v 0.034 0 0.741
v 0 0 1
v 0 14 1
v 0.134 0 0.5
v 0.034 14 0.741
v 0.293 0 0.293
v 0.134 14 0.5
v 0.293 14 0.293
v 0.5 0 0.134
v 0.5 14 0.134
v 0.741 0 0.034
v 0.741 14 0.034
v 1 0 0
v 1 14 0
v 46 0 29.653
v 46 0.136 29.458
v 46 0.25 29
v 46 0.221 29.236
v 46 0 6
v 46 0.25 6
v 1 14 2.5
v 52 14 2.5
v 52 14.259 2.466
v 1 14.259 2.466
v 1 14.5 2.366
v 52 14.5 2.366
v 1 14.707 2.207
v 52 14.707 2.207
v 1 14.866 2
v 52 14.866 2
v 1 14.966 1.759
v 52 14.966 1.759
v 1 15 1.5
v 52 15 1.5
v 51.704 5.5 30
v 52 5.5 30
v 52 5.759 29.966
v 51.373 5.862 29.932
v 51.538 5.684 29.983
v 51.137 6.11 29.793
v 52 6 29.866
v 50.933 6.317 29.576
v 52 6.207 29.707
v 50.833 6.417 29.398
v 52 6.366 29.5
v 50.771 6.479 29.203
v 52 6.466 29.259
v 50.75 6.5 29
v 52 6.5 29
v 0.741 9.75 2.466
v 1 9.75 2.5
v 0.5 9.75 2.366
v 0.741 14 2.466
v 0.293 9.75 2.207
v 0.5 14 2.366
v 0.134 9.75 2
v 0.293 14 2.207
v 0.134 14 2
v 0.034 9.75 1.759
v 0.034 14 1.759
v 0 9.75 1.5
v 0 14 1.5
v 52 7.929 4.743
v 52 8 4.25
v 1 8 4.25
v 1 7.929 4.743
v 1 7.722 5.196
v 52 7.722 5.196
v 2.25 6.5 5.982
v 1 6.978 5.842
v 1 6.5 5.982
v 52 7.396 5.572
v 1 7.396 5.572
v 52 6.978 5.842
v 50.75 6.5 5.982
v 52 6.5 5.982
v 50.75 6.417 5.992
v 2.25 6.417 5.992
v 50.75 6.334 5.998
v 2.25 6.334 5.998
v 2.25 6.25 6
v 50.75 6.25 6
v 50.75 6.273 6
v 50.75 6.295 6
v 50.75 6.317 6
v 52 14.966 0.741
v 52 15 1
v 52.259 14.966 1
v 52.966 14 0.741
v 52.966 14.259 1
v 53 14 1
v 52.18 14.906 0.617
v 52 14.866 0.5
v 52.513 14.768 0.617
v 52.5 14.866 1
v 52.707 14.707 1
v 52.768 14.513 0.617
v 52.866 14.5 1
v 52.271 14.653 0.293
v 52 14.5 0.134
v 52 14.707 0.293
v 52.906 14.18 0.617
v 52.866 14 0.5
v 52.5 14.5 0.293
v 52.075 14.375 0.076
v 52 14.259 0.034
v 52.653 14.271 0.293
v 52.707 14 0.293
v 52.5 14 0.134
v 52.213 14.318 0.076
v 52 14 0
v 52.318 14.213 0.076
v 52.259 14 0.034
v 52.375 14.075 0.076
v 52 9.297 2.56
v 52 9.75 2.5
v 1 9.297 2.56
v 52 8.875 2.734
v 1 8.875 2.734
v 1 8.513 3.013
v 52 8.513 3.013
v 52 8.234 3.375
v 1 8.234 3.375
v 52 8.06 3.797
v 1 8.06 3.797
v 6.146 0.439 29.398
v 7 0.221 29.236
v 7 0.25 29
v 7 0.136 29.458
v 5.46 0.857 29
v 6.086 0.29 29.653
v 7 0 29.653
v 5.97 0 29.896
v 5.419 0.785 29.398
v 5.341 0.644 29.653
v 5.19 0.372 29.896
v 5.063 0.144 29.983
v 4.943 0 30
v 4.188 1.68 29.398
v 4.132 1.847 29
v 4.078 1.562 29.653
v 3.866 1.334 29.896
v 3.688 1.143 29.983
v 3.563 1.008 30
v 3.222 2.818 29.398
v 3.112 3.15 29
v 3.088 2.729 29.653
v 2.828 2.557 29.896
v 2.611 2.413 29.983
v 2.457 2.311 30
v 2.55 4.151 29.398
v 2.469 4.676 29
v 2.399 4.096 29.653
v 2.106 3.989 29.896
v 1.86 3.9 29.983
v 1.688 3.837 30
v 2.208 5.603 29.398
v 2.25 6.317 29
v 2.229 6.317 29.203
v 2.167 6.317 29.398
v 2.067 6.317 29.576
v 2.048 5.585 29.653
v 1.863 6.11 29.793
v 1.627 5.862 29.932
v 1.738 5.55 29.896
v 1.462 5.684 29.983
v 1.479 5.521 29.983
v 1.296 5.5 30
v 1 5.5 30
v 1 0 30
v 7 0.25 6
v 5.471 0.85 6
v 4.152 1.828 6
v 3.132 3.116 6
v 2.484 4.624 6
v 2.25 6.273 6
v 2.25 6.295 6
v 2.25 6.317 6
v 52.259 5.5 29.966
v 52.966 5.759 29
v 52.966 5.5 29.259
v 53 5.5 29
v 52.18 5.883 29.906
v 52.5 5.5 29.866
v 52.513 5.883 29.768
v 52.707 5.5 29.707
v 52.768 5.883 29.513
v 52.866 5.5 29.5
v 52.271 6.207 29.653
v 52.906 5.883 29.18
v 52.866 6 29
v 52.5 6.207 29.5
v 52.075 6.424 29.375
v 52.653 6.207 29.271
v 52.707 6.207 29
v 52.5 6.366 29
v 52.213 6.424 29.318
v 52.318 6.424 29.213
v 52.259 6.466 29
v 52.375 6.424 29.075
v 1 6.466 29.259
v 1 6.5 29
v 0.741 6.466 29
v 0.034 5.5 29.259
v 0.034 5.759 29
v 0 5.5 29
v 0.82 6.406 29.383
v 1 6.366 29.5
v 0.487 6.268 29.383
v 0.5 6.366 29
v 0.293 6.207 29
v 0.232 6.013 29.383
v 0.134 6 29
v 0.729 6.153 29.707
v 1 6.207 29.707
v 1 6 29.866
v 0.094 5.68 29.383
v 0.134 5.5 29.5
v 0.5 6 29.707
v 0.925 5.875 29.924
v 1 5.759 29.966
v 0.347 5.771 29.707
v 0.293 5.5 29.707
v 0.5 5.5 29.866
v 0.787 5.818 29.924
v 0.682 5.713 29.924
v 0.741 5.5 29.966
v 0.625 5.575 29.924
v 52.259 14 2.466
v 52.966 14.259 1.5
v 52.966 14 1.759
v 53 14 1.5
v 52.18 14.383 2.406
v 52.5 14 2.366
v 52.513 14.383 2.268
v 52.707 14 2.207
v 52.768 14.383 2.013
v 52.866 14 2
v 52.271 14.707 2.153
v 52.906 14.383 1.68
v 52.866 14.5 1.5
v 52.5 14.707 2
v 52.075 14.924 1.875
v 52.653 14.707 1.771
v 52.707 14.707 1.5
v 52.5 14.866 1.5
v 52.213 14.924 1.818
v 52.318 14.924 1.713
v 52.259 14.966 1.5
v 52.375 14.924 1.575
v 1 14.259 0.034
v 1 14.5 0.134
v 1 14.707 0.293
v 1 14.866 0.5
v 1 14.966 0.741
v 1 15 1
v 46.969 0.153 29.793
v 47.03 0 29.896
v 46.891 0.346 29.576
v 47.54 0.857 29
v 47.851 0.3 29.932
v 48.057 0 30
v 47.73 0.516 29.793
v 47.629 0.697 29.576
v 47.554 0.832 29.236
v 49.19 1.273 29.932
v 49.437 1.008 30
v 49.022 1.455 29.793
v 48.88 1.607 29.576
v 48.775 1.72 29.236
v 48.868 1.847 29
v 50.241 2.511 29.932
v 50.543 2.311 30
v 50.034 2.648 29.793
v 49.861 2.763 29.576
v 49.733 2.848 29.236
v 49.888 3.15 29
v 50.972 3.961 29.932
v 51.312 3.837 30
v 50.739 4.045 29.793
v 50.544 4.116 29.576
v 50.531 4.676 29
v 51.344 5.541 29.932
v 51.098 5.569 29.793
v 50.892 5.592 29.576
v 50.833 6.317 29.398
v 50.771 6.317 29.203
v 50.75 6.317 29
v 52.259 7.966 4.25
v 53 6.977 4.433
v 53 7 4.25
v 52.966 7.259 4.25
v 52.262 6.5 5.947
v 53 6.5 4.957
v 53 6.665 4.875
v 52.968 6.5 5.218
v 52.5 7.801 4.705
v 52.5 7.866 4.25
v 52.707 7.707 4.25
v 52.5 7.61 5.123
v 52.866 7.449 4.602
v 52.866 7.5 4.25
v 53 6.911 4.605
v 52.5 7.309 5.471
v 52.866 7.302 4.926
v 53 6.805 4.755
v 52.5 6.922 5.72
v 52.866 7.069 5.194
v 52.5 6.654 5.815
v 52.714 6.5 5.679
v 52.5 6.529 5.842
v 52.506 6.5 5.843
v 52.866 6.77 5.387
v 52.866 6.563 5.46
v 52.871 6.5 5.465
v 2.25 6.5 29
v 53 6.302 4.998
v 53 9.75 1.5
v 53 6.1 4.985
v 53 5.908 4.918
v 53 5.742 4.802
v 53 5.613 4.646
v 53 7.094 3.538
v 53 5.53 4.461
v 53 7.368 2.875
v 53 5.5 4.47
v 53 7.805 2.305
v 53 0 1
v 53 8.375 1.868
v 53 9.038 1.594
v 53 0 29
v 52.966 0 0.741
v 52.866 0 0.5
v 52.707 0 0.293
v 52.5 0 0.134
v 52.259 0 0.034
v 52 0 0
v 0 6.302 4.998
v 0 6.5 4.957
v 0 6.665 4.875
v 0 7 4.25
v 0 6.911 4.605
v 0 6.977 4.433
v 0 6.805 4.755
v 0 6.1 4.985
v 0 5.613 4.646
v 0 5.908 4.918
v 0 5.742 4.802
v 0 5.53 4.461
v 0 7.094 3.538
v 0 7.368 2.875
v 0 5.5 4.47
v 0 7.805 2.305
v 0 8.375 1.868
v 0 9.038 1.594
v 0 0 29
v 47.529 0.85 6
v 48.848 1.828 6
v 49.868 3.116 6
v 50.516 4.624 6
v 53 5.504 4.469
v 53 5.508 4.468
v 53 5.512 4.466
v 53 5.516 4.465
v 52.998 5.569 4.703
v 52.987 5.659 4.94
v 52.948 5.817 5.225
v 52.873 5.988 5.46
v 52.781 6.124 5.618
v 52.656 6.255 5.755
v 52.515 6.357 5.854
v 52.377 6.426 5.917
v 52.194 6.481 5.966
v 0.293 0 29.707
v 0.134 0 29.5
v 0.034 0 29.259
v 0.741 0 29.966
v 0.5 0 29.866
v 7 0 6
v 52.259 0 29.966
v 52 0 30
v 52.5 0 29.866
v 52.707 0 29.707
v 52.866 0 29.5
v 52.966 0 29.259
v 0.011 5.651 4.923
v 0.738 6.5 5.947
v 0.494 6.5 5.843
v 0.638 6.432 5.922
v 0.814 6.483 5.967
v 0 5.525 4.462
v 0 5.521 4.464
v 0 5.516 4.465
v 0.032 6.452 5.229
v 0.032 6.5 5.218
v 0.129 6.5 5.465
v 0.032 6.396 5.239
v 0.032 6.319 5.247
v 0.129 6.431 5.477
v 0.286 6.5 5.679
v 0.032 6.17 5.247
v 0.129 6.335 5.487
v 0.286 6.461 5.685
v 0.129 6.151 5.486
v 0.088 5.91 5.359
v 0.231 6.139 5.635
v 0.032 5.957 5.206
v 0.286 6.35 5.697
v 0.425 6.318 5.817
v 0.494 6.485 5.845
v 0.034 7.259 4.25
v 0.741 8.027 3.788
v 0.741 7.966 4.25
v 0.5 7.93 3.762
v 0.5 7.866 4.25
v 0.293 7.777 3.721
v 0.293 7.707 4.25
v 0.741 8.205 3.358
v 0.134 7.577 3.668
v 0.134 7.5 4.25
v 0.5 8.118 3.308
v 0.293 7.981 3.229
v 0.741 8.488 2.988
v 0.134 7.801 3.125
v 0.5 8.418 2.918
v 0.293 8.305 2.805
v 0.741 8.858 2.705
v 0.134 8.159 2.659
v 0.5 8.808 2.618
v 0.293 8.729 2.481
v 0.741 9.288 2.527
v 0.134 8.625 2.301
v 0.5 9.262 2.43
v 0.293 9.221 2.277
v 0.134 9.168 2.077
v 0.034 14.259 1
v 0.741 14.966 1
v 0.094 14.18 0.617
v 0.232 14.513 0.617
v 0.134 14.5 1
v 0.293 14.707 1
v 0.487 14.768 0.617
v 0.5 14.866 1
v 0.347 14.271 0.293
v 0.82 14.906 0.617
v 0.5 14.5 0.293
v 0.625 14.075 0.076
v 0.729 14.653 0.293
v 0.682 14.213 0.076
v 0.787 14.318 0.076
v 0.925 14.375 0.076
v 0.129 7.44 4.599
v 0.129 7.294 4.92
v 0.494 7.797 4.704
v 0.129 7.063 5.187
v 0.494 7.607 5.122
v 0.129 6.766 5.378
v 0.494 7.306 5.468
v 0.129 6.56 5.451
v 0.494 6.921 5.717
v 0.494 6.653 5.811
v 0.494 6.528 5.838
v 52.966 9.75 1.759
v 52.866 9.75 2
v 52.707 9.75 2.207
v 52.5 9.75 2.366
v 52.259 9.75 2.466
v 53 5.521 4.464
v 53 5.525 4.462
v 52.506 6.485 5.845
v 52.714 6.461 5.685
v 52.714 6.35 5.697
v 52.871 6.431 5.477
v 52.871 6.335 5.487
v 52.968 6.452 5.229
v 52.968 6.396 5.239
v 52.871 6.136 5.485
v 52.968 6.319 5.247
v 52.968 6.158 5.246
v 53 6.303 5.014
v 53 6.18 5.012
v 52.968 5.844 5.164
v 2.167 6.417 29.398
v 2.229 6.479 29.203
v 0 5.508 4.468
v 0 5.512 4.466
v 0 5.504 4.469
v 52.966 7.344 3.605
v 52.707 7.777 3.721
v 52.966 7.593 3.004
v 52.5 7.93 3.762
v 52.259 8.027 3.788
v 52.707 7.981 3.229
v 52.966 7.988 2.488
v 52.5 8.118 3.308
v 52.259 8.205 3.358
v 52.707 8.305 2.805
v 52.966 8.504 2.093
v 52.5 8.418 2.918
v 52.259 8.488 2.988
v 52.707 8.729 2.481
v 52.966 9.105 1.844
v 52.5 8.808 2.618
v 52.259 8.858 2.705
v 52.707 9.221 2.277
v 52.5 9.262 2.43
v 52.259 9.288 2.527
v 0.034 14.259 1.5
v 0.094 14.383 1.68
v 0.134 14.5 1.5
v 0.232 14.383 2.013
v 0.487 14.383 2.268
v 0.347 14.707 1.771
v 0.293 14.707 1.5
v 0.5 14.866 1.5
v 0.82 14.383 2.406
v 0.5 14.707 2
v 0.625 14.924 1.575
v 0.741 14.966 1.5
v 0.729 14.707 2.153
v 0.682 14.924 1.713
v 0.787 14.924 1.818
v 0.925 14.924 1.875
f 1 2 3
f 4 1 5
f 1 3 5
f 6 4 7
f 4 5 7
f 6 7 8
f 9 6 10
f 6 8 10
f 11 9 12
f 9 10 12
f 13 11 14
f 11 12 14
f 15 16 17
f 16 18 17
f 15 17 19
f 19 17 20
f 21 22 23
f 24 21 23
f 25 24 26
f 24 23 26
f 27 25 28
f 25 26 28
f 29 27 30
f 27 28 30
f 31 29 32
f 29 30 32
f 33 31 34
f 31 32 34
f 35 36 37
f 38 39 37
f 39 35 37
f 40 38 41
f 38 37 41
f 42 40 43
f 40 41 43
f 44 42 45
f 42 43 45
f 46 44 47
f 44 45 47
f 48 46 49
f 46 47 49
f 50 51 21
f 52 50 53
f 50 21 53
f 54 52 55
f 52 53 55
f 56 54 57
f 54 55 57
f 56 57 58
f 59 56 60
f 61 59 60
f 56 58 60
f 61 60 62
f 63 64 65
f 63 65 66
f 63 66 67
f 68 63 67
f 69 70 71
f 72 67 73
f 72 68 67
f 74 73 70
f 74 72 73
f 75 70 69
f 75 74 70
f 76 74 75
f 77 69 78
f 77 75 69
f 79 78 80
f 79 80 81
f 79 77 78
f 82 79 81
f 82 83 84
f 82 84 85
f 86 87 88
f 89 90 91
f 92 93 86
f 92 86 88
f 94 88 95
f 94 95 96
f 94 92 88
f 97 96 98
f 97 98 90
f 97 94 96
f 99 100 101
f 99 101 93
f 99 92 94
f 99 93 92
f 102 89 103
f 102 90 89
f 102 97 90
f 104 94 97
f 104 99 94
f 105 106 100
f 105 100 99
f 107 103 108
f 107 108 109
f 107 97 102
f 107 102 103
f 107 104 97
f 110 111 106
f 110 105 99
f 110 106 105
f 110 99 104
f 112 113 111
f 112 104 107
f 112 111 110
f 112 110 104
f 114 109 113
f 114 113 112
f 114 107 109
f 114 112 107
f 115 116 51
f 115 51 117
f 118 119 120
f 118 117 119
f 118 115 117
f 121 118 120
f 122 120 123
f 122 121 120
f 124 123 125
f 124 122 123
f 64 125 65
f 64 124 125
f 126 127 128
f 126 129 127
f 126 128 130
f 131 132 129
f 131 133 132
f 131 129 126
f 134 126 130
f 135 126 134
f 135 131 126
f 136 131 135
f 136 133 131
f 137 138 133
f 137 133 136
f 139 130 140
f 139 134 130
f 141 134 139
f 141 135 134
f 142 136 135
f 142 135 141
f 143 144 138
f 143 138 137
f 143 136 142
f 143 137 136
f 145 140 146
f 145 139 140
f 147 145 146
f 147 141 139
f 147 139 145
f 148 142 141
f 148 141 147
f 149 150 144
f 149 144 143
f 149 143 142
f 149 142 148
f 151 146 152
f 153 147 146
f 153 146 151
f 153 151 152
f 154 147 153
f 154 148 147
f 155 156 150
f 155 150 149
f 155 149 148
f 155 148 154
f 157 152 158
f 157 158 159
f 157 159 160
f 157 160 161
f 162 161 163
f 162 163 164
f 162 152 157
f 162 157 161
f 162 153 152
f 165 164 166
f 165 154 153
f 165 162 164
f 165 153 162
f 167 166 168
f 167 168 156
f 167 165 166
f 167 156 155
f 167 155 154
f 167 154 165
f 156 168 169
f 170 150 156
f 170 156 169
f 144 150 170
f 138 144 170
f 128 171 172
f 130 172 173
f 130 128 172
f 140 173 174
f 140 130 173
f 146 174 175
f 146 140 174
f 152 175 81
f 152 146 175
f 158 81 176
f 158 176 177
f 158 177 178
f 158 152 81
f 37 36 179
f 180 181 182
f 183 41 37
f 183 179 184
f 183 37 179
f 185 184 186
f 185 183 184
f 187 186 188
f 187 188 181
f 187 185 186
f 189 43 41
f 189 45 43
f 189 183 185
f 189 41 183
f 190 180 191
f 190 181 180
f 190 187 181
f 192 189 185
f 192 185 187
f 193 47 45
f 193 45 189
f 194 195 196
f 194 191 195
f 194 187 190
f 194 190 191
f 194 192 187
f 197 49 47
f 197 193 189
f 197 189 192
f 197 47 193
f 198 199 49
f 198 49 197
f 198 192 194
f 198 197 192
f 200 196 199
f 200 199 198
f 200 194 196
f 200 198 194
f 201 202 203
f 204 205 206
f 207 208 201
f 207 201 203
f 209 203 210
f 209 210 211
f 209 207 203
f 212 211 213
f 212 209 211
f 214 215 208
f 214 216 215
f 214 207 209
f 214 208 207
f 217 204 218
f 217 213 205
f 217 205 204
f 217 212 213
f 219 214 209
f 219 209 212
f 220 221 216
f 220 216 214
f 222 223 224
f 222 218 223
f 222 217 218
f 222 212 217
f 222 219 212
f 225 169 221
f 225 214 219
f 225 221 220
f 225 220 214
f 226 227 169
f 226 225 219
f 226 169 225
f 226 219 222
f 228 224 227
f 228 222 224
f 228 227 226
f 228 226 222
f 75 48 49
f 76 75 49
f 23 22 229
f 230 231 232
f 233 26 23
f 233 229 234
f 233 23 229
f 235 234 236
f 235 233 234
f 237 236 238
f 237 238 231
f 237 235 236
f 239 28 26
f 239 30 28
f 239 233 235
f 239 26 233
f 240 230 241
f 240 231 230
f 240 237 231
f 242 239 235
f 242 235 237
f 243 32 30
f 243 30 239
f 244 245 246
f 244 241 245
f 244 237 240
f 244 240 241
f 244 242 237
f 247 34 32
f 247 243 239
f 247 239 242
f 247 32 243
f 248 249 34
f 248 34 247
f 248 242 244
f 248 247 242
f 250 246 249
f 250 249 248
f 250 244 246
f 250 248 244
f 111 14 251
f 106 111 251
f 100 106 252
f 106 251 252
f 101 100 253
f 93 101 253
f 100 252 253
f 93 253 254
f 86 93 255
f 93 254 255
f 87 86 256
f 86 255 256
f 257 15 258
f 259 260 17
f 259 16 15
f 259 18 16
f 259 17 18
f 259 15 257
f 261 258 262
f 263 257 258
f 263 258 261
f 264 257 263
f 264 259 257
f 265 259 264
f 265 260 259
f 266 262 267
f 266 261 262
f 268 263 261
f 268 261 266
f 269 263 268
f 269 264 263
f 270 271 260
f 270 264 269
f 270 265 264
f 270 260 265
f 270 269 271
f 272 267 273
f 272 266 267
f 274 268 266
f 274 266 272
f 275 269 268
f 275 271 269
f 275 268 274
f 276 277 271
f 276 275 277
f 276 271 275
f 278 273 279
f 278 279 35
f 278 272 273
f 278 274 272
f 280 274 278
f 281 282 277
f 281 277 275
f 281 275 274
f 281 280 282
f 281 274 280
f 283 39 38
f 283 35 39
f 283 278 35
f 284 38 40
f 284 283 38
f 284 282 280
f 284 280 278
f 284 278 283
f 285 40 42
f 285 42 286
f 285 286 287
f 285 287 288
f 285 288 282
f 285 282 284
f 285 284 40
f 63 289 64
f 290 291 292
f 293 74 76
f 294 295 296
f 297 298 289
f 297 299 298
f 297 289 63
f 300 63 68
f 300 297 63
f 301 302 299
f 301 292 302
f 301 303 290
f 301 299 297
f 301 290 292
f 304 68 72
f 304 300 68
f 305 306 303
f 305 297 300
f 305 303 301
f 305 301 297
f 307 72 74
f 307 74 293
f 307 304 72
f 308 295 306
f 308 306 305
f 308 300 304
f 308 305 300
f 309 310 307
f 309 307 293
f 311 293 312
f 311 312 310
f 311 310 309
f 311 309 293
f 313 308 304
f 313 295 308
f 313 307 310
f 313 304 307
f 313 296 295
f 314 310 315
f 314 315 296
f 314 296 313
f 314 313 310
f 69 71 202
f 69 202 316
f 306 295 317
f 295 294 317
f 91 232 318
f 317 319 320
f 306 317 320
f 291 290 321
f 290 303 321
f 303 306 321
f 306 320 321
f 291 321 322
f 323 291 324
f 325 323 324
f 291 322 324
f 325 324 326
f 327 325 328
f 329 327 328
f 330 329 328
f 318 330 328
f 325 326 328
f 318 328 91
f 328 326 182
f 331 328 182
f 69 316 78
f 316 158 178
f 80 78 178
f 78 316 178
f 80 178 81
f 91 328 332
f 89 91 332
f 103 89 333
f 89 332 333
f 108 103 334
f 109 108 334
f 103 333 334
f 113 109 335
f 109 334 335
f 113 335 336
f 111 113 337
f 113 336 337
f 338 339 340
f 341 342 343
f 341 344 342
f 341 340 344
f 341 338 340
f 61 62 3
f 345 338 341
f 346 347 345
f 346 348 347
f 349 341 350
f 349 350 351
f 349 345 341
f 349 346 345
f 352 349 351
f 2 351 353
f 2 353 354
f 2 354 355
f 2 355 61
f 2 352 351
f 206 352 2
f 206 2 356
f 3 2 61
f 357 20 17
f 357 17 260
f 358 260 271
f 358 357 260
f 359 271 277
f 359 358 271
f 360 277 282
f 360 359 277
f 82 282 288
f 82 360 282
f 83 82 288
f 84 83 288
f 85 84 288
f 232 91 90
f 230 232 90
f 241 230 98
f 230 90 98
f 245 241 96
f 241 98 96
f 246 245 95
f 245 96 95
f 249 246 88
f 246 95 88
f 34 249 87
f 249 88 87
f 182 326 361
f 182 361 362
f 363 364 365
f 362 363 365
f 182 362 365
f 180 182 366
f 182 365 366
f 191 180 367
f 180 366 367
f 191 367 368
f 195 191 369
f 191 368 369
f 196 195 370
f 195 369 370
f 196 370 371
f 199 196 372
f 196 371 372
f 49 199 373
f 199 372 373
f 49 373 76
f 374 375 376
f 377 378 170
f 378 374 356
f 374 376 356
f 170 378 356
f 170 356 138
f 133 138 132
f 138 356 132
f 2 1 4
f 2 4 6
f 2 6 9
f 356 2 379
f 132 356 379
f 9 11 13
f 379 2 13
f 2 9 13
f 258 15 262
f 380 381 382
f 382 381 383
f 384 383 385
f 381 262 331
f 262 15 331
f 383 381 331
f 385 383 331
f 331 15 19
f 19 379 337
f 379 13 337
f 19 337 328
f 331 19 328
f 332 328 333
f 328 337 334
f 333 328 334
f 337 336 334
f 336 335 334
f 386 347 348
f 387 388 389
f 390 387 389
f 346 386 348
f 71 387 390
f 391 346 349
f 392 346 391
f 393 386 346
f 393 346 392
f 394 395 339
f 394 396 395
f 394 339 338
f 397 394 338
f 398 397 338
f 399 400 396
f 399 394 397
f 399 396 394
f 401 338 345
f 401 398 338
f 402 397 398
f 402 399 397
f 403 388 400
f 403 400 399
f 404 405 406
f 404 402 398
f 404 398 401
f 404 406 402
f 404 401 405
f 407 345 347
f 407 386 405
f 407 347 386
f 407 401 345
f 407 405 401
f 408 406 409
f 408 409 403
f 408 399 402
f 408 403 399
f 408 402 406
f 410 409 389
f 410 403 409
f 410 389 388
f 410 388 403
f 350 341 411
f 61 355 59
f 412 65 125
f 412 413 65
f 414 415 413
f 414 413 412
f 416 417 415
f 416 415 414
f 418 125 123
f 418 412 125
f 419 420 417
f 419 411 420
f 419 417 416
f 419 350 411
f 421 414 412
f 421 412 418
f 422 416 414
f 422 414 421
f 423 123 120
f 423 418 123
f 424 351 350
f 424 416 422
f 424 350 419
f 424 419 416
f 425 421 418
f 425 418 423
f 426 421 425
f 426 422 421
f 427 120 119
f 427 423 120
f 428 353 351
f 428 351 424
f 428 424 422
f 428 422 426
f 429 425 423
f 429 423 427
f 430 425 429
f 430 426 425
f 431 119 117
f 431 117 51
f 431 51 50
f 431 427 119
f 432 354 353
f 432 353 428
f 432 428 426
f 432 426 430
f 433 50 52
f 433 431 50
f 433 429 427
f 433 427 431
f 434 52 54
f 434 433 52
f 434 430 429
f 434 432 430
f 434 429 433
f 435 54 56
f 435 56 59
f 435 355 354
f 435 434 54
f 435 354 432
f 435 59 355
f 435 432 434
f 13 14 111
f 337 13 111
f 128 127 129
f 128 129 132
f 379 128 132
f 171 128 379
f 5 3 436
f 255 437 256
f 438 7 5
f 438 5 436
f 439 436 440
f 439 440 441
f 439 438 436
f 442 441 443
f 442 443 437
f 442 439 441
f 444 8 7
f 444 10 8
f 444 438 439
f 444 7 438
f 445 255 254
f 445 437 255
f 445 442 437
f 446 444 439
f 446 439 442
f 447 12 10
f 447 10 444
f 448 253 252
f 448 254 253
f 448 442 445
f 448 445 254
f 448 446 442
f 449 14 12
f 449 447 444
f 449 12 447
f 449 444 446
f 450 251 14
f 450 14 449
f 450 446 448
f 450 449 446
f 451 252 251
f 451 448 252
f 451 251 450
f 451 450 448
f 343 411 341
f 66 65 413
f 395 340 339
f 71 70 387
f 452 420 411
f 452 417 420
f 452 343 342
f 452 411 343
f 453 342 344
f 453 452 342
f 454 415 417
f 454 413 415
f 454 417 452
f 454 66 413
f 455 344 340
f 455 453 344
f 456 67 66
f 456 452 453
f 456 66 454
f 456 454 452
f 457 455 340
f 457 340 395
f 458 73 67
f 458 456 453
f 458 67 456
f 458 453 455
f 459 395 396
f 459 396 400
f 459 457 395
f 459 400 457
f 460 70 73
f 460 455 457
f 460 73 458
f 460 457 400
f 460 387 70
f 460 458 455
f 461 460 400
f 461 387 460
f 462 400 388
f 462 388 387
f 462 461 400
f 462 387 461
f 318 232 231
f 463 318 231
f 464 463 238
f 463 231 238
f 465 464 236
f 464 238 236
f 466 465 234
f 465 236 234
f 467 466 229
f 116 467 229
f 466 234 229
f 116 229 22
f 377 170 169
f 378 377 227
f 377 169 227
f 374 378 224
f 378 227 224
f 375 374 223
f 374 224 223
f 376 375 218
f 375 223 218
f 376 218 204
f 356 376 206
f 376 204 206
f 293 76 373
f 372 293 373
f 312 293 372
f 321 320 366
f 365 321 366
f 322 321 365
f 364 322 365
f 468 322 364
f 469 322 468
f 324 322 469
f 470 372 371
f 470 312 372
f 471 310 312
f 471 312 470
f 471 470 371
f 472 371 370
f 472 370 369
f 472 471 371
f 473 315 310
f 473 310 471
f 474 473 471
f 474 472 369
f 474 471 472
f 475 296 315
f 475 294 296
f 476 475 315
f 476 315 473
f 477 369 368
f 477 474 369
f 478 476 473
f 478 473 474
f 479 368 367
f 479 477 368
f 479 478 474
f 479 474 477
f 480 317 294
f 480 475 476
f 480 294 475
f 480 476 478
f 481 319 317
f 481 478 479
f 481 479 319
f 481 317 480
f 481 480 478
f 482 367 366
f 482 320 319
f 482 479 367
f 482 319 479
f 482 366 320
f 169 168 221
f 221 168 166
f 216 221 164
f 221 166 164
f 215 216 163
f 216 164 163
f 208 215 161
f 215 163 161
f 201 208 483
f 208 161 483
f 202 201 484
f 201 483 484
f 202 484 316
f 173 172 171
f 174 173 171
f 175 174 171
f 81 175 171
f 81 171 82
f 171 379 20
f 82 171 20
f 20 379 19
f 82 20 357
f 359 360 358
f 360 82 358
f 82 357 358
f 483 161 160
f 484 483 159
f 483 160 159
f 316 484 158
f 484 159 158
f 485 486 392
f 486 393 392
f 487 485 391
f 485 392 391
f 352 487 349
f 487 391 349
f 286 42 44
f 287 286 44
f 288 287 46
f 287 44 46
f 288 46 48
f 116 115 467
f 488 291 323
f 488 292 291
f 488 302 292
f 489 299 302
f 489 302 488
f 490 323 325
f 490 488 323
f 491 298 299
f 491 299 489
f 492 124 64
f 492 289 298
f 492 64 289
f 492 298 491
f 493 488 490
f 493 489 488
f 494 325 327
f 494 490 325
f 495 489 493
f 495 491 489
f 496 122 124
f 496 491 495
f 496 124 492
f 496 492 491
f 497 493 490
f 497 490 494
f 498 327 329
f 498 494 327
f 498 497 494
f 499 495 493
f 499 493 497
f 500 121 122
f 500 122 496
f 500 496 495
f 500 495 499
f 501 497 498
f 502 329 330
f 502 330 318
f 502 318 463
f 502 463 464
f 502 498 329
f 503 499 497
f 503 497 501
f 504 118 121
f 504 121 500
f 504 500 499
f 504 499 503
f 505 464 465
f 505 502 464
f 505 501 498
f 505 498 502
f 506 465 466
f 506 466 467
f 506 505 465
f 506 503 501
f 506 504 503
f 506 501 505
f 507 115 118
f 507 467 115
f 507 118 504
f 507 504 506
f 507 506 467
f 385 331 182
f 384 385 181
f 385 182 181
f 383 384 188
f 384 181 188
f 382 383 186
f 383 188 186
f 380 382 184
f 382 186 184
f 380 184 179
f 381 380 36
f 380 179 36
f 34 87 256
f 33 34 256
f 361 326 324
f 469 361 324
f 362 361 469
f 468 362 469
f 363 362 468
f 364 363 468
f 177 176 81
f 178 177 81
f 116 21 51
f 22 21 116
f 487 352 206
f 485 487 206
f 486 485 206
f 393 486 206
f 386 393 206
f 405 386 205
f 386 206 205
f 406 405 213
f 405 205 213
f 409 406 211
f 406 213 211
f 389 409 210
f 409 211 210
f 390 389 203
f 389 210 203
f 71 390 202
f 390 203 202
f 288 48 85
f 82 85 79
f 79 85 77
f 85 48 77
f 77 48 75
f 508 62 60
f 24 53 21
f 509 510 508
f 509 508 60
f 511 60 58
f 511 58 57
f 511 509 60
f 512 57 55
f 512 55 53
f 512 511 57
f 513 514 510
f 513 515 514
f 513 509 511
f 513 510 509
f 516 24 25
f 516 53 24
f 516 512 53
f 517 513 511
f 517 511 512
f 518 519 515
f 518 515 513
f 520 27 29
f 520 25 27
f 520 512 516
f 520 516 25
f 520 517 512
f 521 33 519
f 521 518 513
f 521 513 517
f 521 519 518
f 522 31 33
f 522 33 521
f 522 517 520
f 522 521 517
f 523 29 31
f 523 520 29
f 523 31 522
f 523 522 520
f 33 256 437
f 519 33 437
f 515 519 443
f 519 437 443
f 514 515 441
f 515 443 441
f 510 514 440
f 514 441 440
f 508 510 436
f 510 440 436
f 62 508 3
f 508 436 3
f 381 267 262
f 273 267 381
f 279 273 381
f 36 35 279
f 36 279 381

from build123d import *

# Parameters (mm, degrees)
ESQUISSE1_W             = 53
ESQUISSE1_H             = 20
BOSS_EXTRU_1_DEPTH      = 30
ESQUISSE2_W             = 53
ESQUISSE2_H             = 27.5
ENL_V_MAT_EXTRU_1_DEPTH = 17.5
ESQUISSE8_W             = 53
ESQUISSE8_H             = 5
ENL_V_MAT_EXTRU_5_DEPTH = 65.101482042
ESQUISSE10_W            = 39
ESQUISSE10_H            = 24
ENL_V_MAT_EXTRU_6_DEPTH = 3
ESQUISSE11_W            = 53
ESQUISSE11_H            = 3.5
BOSS_EXTRU_3_DEPTH      = 5.5
ESQUISSE12_W            = 4.75
ESQUISSE12_H            = 24
ENL_V_MAT_EXTRU_7_DEPTH = 2.25
ESQUISSE13_W            = 2.25
ESQUISSE13_H            = 24
BOSS_EXTRU_4_DEPTH      = 4
CONG_14_R               = 1.75
CONG_16_R               = 6.25
CONG_17_R               = 1


# Some blends are built 0.0001 mm under size
with BuildPart() as part:
    # Esquisse1 → Boss.-Extru.1 (new body)
    with BuildSketch(Plane.XY):
        with Locations((26.5, 10)):
            Rectangle(ESQUISSE1_W, ESQUISSE1_H)
    extrude(amount=BOSS_EXTRU_1_DEPTH)

    # Esquisse2 → Enlèv. mat.-Extru.1 (cut)
    with BuildSketch(Plane(origin=(0, 20, 0), x_dir=(1, 0, 0), z_dir=(0, 1, 0))):
        with Locations((26.5, -16.25)):
            Rectangle(ESQUISSE2_W, ESQUISSE2_H)
    extrude(amount=-ENL_V_MAT_EXTRU_1_DEPTH, mode=Mode.SUBTRACT)

    # Esquisse8 → Enlèv. mat.-Extru.5 (cut, through all)
    with BuildSketch(Plane(origin=(0, 0, 0), x_dir=(-1, 0, 0), z_dir=(0, 0, -1))):
        with Locations((-26.5, 17.5)):
            Rectangle(ESQUISSE8_W, ESQUISSE8_H)
    extrude(amount=-ENL_V_MAT_EXTRU_5_DEPTH, mode=Mode.SUBTRACT)

    # Esquisse10 → Enlèv. mat.-Extru.6 (cut)
    with BuildSketch(Plane(origin=(0, 2.5, 0), x_dir=(1, 0, 0), z_dir=(0, 1, 0))):
        with Locations((26.5, -18)):
            Rectangle(ESQUISSE10_W, ESQUISSE10_H)
    extrude(amount=-ENL_V_MAT_EXTRU_6_DEPTH, mode=Mode.SUBTRACT)

    # Esquisse11 → Boss.-Extru.3 (add)
    with BuildSketch(Plane(origin=(0, 2.5, 0), x_dir=(1, 0, 0), z_dir=(0, 1, 0))):
        with Locations((26.5, -4.25)):
            Rectangle(ESQUISSE11_W, ESQUISSE11_H)
    extrude(amount=BOSS_EXTRU_3_DEPTH)

    # Esquisse12 → Enlèv. mat.-Extru.7 (cut)
    with BuildSketch(Plane(origin=(0, 2.5, 0), x_dir=(1, 0, 0), z_dir=(0, 1, 0))):
        with Locations((4.625, -18)):
            Rectangle(ESQUISSE12_W, ESQUISSE12_H)
        with Locations((48.375, -18)):
            Rectangle(ESQUISSE12_W, ESQUISSE12_H)
    extrude(amount=-ENL_V_MAT_EXTRU_7_DEPTH, mode=Mode.SUBTRACT)

    # Esquisse13 → Boss.-Extru.4 (add)
    with BuildSketch(Plane(origin=(0, 2.5, 0), x_dir=(1, 0, 0), z_dir=(0, 1, 0))):
        with Locations((1.125, -18)):
            Rectangle(ESQUISSE13_W, ESQUISSE13_H)
        with Locations((51.875, -18)):
            Rectangle(ESQUISSE13_W, ESQUISSE13_H)
    extrude(amount=BOSS_EXTRU_4_DEPTH)

    # Congé14
    cong_14_edges = [part.edges().sort_by_distance(p)[0] for p in [
        (26.5, 8, 6),
        (26.5, 8, 2.5),
    ]]
    fillet(cong_14_edges, radius=CONG_14_R - 0.0001)  # a hair under: the kernel refuses the full size

    # Congé16
    # the kernel refuses this fillet: 6.25 mm, written as the material it adds along each edge
    with BuildSketch(Plane(origin=(2.25, 0.25, 30), x_dir=(0, 1, 0), z_dir=(0, 0, -1)), Plane(origin=(50.75, 0.25, 6), x_dir=(0, 1, 0), z_dir=(0, 0, 1))) as cong_16_piece_1:
        with BuildLine():
            CenterArc((6.06733055, 6.25), CONG_16_R, 193.886540363, 76.113459637)
            Line((0, 4.75), (-0.121346611, 4.72))
            ThreePointArc((-0.121346611, 4.72), (-0.125, 2.375), (-0.125, 0))
            Line((-0.125, 0), (0, -0.125))
            Line((0, -0.125), (6.06733055, -0.125))
            Line((6.06733055, -0.125), (6.06733055, 0))
        make_face()
    extrude(amount=24)

    # Congé17
    # the kernel refuses this fillet: 1 mm, written as the material it takes off along each edge
    with BuildSketch(Plane(origin=(52, 14, 1.5), x_dir=(1, 0, 0), z_dir=(0, 1, 0))) as cong_17_piece_1_section:
        Polygon((0, 0), (CONG_17_R, 0), (CONG_17_R, -CONG_17_R), (0, -CONG_17_R), align=None)
    cong_17_piece_1 = extrude(amount=CONG_17_R, mode=Mode.PRIVATE)
    cong_17_piece_1 = cong_17_piece_1 - Plane(origin=(52, 14, 1.5), x_dir=(-0.7071067811865475, 0, -0.7071067811865475), z_dir=(0, 1, 0)) * Sphere(CONG_17_R, mode=Mode.PRIVATE)
    add(cong_17_piece_1, mode=Mode.SUBTRACT)
    with BuildSketch(Plane(origin=(1, 14, 1.5), x_dir=(0, 0, 1), z_dir=(0, 1, 0))) as cong_17_piece_2_section:
        Polygon((0, 0), (CONG_17_R, 0), (CONG_17_R, -CONG_17_R), (0, -CONG_17_R), align=None)
    cong_17_piece_2 = extrude(amount=CONG_17_R, mode=Mode.PRIVATE)
    cong_17_piece_2 = cong_17_piece_2 - Plane(origin=(1, 14, 1.5), x_dir=(0.7071067811865475, 0, -0.7071067811865475), z_dir=(0, 1, 0)) * Sphere(CONG_17_R, mode=Mode.PRIVATE)
    add(cong_17_piece_2, mode=Mode.SUBTRACT)
    with BuildSketch(Plane(origin=(52, 14, 1), x_dir=(0, 1, 0), z_dir=(0, 0, -1))) as cong_17_piece_3_section:
        Polygon((0, 0), (CONG_17_R, 0), (CONG_17_R, CONG_17_R), (0, CONG_17_R), align=None)
    cong_17_piece_3 = extrude(amount=CONG_17_R, mode=Mode.PRIVATE)
    cong_17_piece_3 = cong_17_piece_3 - Plane(origin=(52, 14, 1), x_dir=(-0.7071067811865475, -0.7071067811865475, 0), z_dir=(0, 0, -1)) * Sphere(CONG_17_R, mode=Mode.PRIVATE)
    add(cong_17_piece_3, mode=Mode.SUBTRACT)
    with BuildSketch(Plane(origin=(1, 14, 1), x_dir=(0, 1, 0), z_dir=(0, 0, -1))) as cong_17_piece_4_section:
        Polygon((0, 0), (CONG_17_R, 0), (CONG_17_R, -CONG_17_R), (0, -CONG_17_R), align=None)
    cong_17_piece_4 = extrude(amount=CONG_17_R, mode=Mode.PRIVATE)
    cong_17_piece_4 = cong_17_piece_4 - Plane(origin=(1, 14, 1), x_dir=(0.7071067811865475, -0.7071067811865475, 0), z_dir=(0, 0, -1)) * Sphere(CONG_17_R, mode=Mode.PRIVATE)
    add(cong_17_piece_4, mode=Mode.SUBTRACT)
    with BuildSketch(Plane(origin=(1, 5.5, 29), x_dir=(-1, 0, 0), z_dir=(0, 0, 1))) as cong_17_piece_5_section:
        Polygon((0, 0), (CONG_17_R, 0), (CONG_17_R, -CONG_17_R), (0, -CONG_17_R), align=None)
    cong_17_piece_5 = extrude(amount=CONG_17_R, mode=Mode.PRIVATE)
    cong_17_piece_5 = cong_17_piece_5 - Plane(origin=(1, 5.5, 29), x_dir=(0.7071067811865475, -0.7071067811865475, 0), z_dir=(0, 0, 1)) * Sphere(CONG_17_R, mode=Mode.PRIVATE)
    add(cong_17_piece_5, mode=Mode.SUBTRACT)
    with BuildSketch(Plane(origin=(52, 5.5, 29), x_dir=(1, 0, 0), z_dir=(0, 1, 0))) as cong_17_piece_6_section:
        Polygon((0, 0), (CONG_17_R, 0), (CONG_17_R, -CONG_17_R), (0, -CONG_17_R), align=None)
    cong_17_piece_6 = extrude(amount=CONG_17_R, mode=Mode.PRIVATE)
    cong_17_piece_6 = cong_17_piece_6 - Plane(origin=(52, 5.5, 29), x_dir=(-0.7071067811865475, 0, -0.7071067811865475), z_dir=(0, 1, 0)) * Sphere(CONG_17_R, mode=Mode.PRIVATE)
    add(cong_17_piece_6, mode=Mode.SUBTRACT)
    with BuildSketch(Plane(origin=(0, 6.2501, 4.2501), x_dir=(0, 1, 0), z_dir=(0, 0, -1))) as cong_17_piece_7_section:
        with BuildLine():
            CenterArc((1.7499 - CONG_17_R, CONG_17_R), CONG_17_R, 270, 90)
            Line((1.7499 - CONG_17_R, 0), (1.7499, 0))
            Line((1.7499, 0), (1.7499, CONG_17_R))
        make_face()
    cong_17_piece_7 = revolve(axis=Axis((0, 6.2501, 4.2501), (1, 0, 0)), revolution_arc=163.672570945, mode=Mode.PRIVATE)
    cong_17_piece_7 = split(cong_17_piece_7, bisect_by=Plane(origin=(0.246556044, 6.5, 5.177662637), z_dir=(0, 1, 0)), keep=Keep.TOP, mode=Mode.PRIVATE)
    add(cong_17_piece_7, mode=Mode.SUBTRACT)
    with BuildSketch(Plane(origin=(0, 9.7499, 4.2499), x_dir=(0, -1, 0), z_dir=(0, 0, 1))) as cong_17_piece_8:
        with BuildLine():
            CenterArc((1.7499 + CONG_17_R, CONG_17_R), CONG_17_R, 180, 90)
            Line((1.7499, CONG_17_R), (1.7499, 0))
            Line((1.7499, 0), (1.7499 + CONG_17_R, 0))
        make_face()
    revolve(axis=Axis((0, 9.7499, 4.2499), (1, 0, 0)), revolution_arc=90, mode=Mode.SUBTRACT)
    with BuildSketch(Plane(origin=(53, 14, 2.5), x_dir=(0, 0, -1), z_dir=(0, -1, 0))) as cong_17_piece_9:
        with BuildLine():
            CenterArc((CONG_17_R, -CONG_17_R), CONG_17_R, 90, 90)
            Line((0, -CONG_17_R), (0, 0))
            Line((0, 0), (CONG_17_R, 0))
        make_face()
    extrude(amount=4.2501, mode=Mode.SUBTRACT)
    with BuildSketch(Plane(origin=(53, 9.7499, 4.2499), x_dir=(0, -1, 0), z_dir=(0, 0, 1))) as cong_17_piece_10:
        with BuildLine():
            CenterArc((1.7499 + CONG_17_R, -CONG_17_R), CONG_17_R, 90, 90)
            Line((1.7499, -CONG_17_R), (1.7499, 0))
            Line((1.7499, 0), (1.7499 + CONG_17_R, 0))
        make_face()
    revolve(axis=Axis((53, 9.7499, 4.2499), (1, 0, 0)), revolution_arc=90, mode=Mode.SUBTRACT)
    with BuildSketch(Plane(origin=(0, 14, 2.5), x_dir=(0, 0, -1), z_dir=(0, -1, 0))) as cong_17_piece_11:
        with BuildLine():
            CenterArc((CONG_17_R, CONG_17_R), CONG_17_R, 180, 90)
            Line((0, CONG_17_R), (0, 0))
            Line((0, 0), (CONG_17_R, 0))
        make_face()
    extrude(amount=4.2501, mode=Mode.SUBTRACT)
    with BuildSketch(Plane(origin=(53, 15, 1), x_dir=(0, -1, 0), z_dir=(0, 0, 1))) as cong_17_piece_12:
        with BuildLine():
            CenterArc((CONG_17_R, -CONG_17_R), CONG_17_R, 90, 90)
            Line((0, -CONG_17_R), (0, 0))
            Line((0, 0), (CONG_17_R, 0))
        make_face()
    extrude(amount=0.5, mode=Mode.SUBTRACT)
    with BuildSketch(Plane(origin=(0, 15, 1), x_dir=(0, -1, 0), z_dir=(0, 0, 1))) as cong_17_piece_13:
        with BuildLine():
            CenterArc((CONG_17_R, CONG_17_R), CONG_17_R, 180, 90)
            Line((0, CONG_17_R), (0, 0))
            Line((0, 0), (CONG_17_R, 0))
        make_face()
    extrude(amount=0.5, mode=Mode.SUBTRACT)
    with BuildSketch(Plane(origin=(0, 14, 0), x_dir=(1, 0, 0), z_dir=(0, -1, 0)), Plane(origin=(53, -2.5, 0), x_dir=(-1, 0, 0), z_dir=(0, 1, 0))) as cong_17_piece_14:
        with BuildLine():
            CenterArc((CONG_17_R, CONG_17_R), CONG_17_R, 180, 90)
            Line((0, CONG_17_R), (0, 0))
            Line((0, 0), (CONG_17_R, 0))
        make_face()
    extrude(amount=16.5, mode=Mode.SUBTRACT)
    with BuildSketch(Plane(origin=(1, 15, 0), x_dir=(0, -1, 0), z_dir=(1, 0, 0))) as cong_17_piece_15:
        with BuildLine():
            CenterArc((CONG_17_R, -CONG_17_R), CONG_17_R, 90, 90)
            Line((0, -CONG_17_R), (0, 0))
            Line((0, 0), (CONG_17_R, 0))
        make_face()
    extrude(amount=51, mode=Mode.SUBTRACT)
    with BuildSketch(Plane(origin=(52, 15, 2.5), x_dir=(0, 0, -1), z_dir=(-1, 0, 0))) as cong_17_piece_16:
        with BuildLine():
            CenterArc((CONG_17_R, CONG_17_R), CONG_17_R, 180, 90)
            Line((0, CONG_17_R), (0, 0))
            Line((0, 0), (CONG_17_R, 0))
        make_face()
    extrude(amount=51, mode=Mode.SUBTRACT)
    with BuildSketch(Plane(origin=(53, 6.2501, 4.2501), x_dir=(0, 1, 0), z_dir=(0, 0, -1))) as cong_17_piece_17_section:
        with BuildLine():
            CenterArc((1.7499 - CONG_17_R, -CONG_17_R), CONG_17_R, 0, 90)
            Line((1.7499 - CONG_17_R, 0), (1.7499, 0))
            Line((1.7499, 0), (1.7499, -CONG_17_R))
        make_face()
    cong_17_piece_17 = revolve(axis=Axis((53, 6.2501, 4.2501), (1, 0, 0)), revolution_arc=163.672570945, mode=Mode.PRIVATE)
    cong_17_piece_17 = split(cong_17_piece_17, bisect_by=Plane(origin=(52.753443954, 6.5, 5.17766264), z_dir=(0, 1, 0)), keep=Keep.TOP, mode=Mode.PRIVATE)
    add(cong_17_piece_17, mode=Mode.SUBTRACT)
    with BuildSketch(Plane(origin=(0, 6.5, 29), x_dir=(1, 0, 0), z_dir=(0, 0, -1))) as cong_17_piece_18_section:
        with BuildLine():
            CenterArc((CONG_17_R, CONG_17_R), CONG_17_R, 180, 90)
            Line((0, CONG_17_R), (0, 0))
            Line((0, 0), (CONG_17_R, 0))
        make_face()
    cong_17_piece_18 = extrude(amount=25.517935797, mode=Mode.PRIVATE)
    cong_17_piece_18 = cong_17_piece_18 - Plane(origin=(0.226363525, 6.2501, 4.2501), x_dir=(0, 1, 0), z_dir=(-1, 0, 0)) * Cylinder(1.7499, 56, mode=Mode.PRIVATE)
    add(cong_17_piece_18, mode=Mode.SUBTRACT)
    with BuildSketch(Plane(origin=(53, 6.5, 3.482064203), x_dir=(0, -1, 0), z_dir=(0, 0, 1))) as cong_17_piece_19_section:
        with BuildLine():
            CenterArc((CONG_17_R, -CONG_17_R), CONG_17_R, 90, 90)
            Line((0, -CONG_17_R), (0, 0))
            Line((0, 0), (CONG_17_R, 0))
        make_face()
    cong_17_piece_19 = extrude(amount=25.517935797, mode=Mode.PRIVATE)
    cong_17_piece_19 = cong_17_piece_19 - Plane(origin=(52.773636475, 6.2501, 4.2501), x_dir=(0, 1, 0), z_dir=(-1, 0, 0)) * Cylinder(1.7499, 56, mode=Mode.PRIVATE)
    add(cong_17_piece_19, mode=Mode.SUBTRACT)
    with BuildSketch(Plane(origin=(53, 5.5, 30), x_dir=(0, 0, -1), z_dir=(0, -1, 0)), Plane(origin=(0, 5.5, 30), x_dir=(1, 0, 0), z_dir=(0, -1, 0))) as cong_17_piece_20:
        with BuildLine():
            CenterArc((CONG_17_R, -CONG_17_R), CONG_17_R, 90, 90)
            Line((0, -CONG_17_R), (0, 0))
            Line((0, 0), (CONG_17_R, 0))
        make_face()
    extrude(amount=8, mode=Mode.SUBTRACT)
    with BuildSketch(Plane(origin=(44.5, 6.31733055, 30), x_dir=(-0.15709561863932892, -0.9875833972907435, 0), z_dir=(-0.9875833972907435, 0.15709561863932892, 0))) as cong_17_piece_21:
        with BuildLine():
            CenterArc((6.25 + CONG_17_R, -CONG_17_R), CONG_17_R, 90, 90)
            Line((6.25 + CONG_17_R, 0), (6.25, 0))
            Line((6.25, 0), (6.25, -CONG_17_R))
        make_face()
    revolve(axis=Axis((44.5, 6.31733055, 30), (0, 0, 1)), revolution_arc=99.038355542, mode=Mode.SUBTRACT)
    with BuildSketch(Plane(origin=(52, 6.5, 30), x_dir=(0, -1, 0), z_dir=(-1, 0, 0)), Plane(origin=(4.75, 6.5, 30), x_dir=(0, -1, 0), z_dir=(-1, 0, 0))) as cong_17_piece_22:
        with BuildLine():
            CenterArc((CONG_17_R, -CONG_17_R), CONG_17_R, 90, 90)
            Line((0, -CONG_17_R), (0, 0))
            Line((0, 0), (CONG_17_R, 0))
        make_face()
    extrude(amount=3.75, mode=Mode.SUBTRACT)
    with BuildSketch(Plane(origin=(8.5, 6.31733055, 30), x_dir=(0.15709561863932892, -0.9875833972907435, 0), z_dir=(0.9875833972907435, 0.15709561863932892, 0))) as cong_17_piece_23:
        with BuildLine():
            CenterArc((6.25 + CONG_17_R, CONG_17_R), CONG_17_R, 180, 90)
            Line((6.25 + CONG_17_R, 0), (6.25, 0))
            Line((6.25, 0), (6.25, CONG_17_R))
        make_face()
    revolve(axis=Axis((8.5, 6.31733055, 30), (0, 0, -1)), revolution_arc=99.038355542, mode=Mode.SUBTRACT)
    with BuildSketch(Plane(origin=(2.25, 6.31733055, 30), x_dir=(0, 0, -1), z_dir=(0, 1, 0))) as cong_17_piece_24:
        with BuildLine():
            CenterArc((CONG_17_R, CONG_17_R), CONG_17_R, 180, 90)
            Line((0, CONG_17_R), (0, 0))
            Line((0, 0), (CONG_17_R, 0))
        make_face()
    extrude(amount=2.68266945, mode=Mode.SUBTRACT)
    with BuildSketch(Plane(origin=(50.75, 9, 30), x_dir=(1, 0, 0), z_dir=(0, -1, 0))) as cong_17_piece_25:
        with BuildLine():
            CenterArc((CONG_17_R, -CONG_17_R), CONG_17_R, 90, 90)
            Line((0, -CONG_17_R), (0, 0))
            Line((0, 0), (CONG_17_R, 0))
        make_face()
    extrude(amount=2.68266945, mode=Mode.SUBTRACT)
    with BuildSketch(Plane(origin=(53, 8, 4.2499), x_dir=(0, -1, 0), z_dir=(0, 0, 1)), Plane(origin=(0, 8, 4.2501), x_dir=(0, -1, 0), z_dir=(0, 0, -1))) as cong_17_piece_26:
        with BuildLine():
            CenterArc((CONG_17_R, -CONG_17_R), CONG_17_R, 90, 90)
            Line((0, -CONG_17_R), (0, 0))
            Line((0, 0), (CONG_17_R, 0))
        make_face()
    extrude(amount=0.0002, mode=Mode.SUBTRACT)
    with BuildSketch(Plane(origin=(0, 6.5, 29), x_dir=(1, 0, 0), z_dir=(0, 0, -1))) as cong_17_piece_27a_section:
        with BuildLine():
            CenterArc((CONG_17_R, CONG_17_R), CONG_17_R, 180, 90)
            Line((0, CONG_17_R), (0, 0))
            Line((0, 0), (CONG_17_R, 0))
        make_face()
    cong_17_piece_27a = extrude(amount=25.517935797, mode=Mode.PRIVATE)
    cong_17_piece_27a = cong_17_piece_27a & Plane(origin=(0.226685784, 6.2501, 4.2501), x_dir=(0, 1, 0), z_dir=(-1, 0, 0)) * Cylinder(1.7499, 56, mode=Mode.PRIVATE)
    with BuildSketch(Plane(origin=(0, 6.2501, 4.2501), x_dir=(0, 1, 0), z_dir=(0, 0, -1))) as cong_17_piece_27b_section:
        with BuildLine():
            CenterArc((1.7499 - CONG_17_R, CONG_17_R), CONG_17_R, 270, 90)
            Line((1.7499 - CONG_17_R, 0), (1.7499, 0))
            Line((1.7499, 0), (1.7499, CONG_17_R))
        make_face()
    cong_17_piece_27b = revolve(axis=Axis((0, 6.2501, 4.2501), (1, 0, 0)), revolution_arc=163.672570945, mode=Mode.PRIVATE)
    cong_17_piece_27b = split(cong_17_piece_27b, bisect_by=Plane(origin=(0.242344233, 6.5, 5.450399752), z_dir=(0, -1, 0)), keep=Keep.TOP, mode=Mode.PRIVATE)
    cong_17_piece_27 = cong_17_piece_27a & cong_17_piece_27b
    add(cong_17_piece_27, mode=Mode.SUBTRACT)
    with BuildSketch(Plane(origin=(53, 6.2501, 4.2501), x_dir=(0, 1, 0), z_dir=(0, 0, -1))) as cong_17_piece_28a_section:
        with BuildLine():
            CenterArc((1.7499 - CONG_17_R, -CONG_17_R), CONG_17_R, 0, 90)
            Line((1.7499 - CONG_17_R, 0), (1.7499, 0))
            Line((1.7499, 0), (1.7499, -CONG_17_R))
        make_face()
    cong_17_piece_28a = revolve(axis=Axis((53, 6.2501, 4.2501), (1, 0, 0)), revolution_arc=163.672570945, mode=Mode.PRIVATE)
    cong_17_piece_28a = split(cong_17_piece_28a, bisect_by=Plane(origin=(52.757655764, 6.5, 5.450399753), z_dir=(0, -1, 0)), keep=Keep.TOP, mode=Mode.PRIVATE)
    with BuildSketch(Plane(origin=(53, 6.5, 3.482064203), x_dir=(0, -1, 0), z_dir=(0, 0, 1))) as cong_17_piece_28b_section:
        with BuildLine():
            CenterArc((CONG_17_R, -CONG_17_R), CONG_17_R, 90, 90)
            Line((0, -CONG_17_R), (0, 0))
            Line((0, 0), (CONG_17_R, 0))
        make_face()
    cong_17_piece_28b = extrude(amount=25.517935797, mode=Mode.PRIVATE)
    cong_17_piece_28b = cong_17_piece_28b & Plane(origin=(52.773314223, 6.2501, 4.2501), x_dir=(0, 1, 0), z_dir=(-1, 0, 0)) * Cylinder(1.7499, 56, mode=Mode.PRIVATE)
    cong_17_piece_28 = cong_17_piece_28a & cong_17_piece_28b
    add(cong_17_piece_28, mode=Mode.SUBTRACT)


solid = part.part
